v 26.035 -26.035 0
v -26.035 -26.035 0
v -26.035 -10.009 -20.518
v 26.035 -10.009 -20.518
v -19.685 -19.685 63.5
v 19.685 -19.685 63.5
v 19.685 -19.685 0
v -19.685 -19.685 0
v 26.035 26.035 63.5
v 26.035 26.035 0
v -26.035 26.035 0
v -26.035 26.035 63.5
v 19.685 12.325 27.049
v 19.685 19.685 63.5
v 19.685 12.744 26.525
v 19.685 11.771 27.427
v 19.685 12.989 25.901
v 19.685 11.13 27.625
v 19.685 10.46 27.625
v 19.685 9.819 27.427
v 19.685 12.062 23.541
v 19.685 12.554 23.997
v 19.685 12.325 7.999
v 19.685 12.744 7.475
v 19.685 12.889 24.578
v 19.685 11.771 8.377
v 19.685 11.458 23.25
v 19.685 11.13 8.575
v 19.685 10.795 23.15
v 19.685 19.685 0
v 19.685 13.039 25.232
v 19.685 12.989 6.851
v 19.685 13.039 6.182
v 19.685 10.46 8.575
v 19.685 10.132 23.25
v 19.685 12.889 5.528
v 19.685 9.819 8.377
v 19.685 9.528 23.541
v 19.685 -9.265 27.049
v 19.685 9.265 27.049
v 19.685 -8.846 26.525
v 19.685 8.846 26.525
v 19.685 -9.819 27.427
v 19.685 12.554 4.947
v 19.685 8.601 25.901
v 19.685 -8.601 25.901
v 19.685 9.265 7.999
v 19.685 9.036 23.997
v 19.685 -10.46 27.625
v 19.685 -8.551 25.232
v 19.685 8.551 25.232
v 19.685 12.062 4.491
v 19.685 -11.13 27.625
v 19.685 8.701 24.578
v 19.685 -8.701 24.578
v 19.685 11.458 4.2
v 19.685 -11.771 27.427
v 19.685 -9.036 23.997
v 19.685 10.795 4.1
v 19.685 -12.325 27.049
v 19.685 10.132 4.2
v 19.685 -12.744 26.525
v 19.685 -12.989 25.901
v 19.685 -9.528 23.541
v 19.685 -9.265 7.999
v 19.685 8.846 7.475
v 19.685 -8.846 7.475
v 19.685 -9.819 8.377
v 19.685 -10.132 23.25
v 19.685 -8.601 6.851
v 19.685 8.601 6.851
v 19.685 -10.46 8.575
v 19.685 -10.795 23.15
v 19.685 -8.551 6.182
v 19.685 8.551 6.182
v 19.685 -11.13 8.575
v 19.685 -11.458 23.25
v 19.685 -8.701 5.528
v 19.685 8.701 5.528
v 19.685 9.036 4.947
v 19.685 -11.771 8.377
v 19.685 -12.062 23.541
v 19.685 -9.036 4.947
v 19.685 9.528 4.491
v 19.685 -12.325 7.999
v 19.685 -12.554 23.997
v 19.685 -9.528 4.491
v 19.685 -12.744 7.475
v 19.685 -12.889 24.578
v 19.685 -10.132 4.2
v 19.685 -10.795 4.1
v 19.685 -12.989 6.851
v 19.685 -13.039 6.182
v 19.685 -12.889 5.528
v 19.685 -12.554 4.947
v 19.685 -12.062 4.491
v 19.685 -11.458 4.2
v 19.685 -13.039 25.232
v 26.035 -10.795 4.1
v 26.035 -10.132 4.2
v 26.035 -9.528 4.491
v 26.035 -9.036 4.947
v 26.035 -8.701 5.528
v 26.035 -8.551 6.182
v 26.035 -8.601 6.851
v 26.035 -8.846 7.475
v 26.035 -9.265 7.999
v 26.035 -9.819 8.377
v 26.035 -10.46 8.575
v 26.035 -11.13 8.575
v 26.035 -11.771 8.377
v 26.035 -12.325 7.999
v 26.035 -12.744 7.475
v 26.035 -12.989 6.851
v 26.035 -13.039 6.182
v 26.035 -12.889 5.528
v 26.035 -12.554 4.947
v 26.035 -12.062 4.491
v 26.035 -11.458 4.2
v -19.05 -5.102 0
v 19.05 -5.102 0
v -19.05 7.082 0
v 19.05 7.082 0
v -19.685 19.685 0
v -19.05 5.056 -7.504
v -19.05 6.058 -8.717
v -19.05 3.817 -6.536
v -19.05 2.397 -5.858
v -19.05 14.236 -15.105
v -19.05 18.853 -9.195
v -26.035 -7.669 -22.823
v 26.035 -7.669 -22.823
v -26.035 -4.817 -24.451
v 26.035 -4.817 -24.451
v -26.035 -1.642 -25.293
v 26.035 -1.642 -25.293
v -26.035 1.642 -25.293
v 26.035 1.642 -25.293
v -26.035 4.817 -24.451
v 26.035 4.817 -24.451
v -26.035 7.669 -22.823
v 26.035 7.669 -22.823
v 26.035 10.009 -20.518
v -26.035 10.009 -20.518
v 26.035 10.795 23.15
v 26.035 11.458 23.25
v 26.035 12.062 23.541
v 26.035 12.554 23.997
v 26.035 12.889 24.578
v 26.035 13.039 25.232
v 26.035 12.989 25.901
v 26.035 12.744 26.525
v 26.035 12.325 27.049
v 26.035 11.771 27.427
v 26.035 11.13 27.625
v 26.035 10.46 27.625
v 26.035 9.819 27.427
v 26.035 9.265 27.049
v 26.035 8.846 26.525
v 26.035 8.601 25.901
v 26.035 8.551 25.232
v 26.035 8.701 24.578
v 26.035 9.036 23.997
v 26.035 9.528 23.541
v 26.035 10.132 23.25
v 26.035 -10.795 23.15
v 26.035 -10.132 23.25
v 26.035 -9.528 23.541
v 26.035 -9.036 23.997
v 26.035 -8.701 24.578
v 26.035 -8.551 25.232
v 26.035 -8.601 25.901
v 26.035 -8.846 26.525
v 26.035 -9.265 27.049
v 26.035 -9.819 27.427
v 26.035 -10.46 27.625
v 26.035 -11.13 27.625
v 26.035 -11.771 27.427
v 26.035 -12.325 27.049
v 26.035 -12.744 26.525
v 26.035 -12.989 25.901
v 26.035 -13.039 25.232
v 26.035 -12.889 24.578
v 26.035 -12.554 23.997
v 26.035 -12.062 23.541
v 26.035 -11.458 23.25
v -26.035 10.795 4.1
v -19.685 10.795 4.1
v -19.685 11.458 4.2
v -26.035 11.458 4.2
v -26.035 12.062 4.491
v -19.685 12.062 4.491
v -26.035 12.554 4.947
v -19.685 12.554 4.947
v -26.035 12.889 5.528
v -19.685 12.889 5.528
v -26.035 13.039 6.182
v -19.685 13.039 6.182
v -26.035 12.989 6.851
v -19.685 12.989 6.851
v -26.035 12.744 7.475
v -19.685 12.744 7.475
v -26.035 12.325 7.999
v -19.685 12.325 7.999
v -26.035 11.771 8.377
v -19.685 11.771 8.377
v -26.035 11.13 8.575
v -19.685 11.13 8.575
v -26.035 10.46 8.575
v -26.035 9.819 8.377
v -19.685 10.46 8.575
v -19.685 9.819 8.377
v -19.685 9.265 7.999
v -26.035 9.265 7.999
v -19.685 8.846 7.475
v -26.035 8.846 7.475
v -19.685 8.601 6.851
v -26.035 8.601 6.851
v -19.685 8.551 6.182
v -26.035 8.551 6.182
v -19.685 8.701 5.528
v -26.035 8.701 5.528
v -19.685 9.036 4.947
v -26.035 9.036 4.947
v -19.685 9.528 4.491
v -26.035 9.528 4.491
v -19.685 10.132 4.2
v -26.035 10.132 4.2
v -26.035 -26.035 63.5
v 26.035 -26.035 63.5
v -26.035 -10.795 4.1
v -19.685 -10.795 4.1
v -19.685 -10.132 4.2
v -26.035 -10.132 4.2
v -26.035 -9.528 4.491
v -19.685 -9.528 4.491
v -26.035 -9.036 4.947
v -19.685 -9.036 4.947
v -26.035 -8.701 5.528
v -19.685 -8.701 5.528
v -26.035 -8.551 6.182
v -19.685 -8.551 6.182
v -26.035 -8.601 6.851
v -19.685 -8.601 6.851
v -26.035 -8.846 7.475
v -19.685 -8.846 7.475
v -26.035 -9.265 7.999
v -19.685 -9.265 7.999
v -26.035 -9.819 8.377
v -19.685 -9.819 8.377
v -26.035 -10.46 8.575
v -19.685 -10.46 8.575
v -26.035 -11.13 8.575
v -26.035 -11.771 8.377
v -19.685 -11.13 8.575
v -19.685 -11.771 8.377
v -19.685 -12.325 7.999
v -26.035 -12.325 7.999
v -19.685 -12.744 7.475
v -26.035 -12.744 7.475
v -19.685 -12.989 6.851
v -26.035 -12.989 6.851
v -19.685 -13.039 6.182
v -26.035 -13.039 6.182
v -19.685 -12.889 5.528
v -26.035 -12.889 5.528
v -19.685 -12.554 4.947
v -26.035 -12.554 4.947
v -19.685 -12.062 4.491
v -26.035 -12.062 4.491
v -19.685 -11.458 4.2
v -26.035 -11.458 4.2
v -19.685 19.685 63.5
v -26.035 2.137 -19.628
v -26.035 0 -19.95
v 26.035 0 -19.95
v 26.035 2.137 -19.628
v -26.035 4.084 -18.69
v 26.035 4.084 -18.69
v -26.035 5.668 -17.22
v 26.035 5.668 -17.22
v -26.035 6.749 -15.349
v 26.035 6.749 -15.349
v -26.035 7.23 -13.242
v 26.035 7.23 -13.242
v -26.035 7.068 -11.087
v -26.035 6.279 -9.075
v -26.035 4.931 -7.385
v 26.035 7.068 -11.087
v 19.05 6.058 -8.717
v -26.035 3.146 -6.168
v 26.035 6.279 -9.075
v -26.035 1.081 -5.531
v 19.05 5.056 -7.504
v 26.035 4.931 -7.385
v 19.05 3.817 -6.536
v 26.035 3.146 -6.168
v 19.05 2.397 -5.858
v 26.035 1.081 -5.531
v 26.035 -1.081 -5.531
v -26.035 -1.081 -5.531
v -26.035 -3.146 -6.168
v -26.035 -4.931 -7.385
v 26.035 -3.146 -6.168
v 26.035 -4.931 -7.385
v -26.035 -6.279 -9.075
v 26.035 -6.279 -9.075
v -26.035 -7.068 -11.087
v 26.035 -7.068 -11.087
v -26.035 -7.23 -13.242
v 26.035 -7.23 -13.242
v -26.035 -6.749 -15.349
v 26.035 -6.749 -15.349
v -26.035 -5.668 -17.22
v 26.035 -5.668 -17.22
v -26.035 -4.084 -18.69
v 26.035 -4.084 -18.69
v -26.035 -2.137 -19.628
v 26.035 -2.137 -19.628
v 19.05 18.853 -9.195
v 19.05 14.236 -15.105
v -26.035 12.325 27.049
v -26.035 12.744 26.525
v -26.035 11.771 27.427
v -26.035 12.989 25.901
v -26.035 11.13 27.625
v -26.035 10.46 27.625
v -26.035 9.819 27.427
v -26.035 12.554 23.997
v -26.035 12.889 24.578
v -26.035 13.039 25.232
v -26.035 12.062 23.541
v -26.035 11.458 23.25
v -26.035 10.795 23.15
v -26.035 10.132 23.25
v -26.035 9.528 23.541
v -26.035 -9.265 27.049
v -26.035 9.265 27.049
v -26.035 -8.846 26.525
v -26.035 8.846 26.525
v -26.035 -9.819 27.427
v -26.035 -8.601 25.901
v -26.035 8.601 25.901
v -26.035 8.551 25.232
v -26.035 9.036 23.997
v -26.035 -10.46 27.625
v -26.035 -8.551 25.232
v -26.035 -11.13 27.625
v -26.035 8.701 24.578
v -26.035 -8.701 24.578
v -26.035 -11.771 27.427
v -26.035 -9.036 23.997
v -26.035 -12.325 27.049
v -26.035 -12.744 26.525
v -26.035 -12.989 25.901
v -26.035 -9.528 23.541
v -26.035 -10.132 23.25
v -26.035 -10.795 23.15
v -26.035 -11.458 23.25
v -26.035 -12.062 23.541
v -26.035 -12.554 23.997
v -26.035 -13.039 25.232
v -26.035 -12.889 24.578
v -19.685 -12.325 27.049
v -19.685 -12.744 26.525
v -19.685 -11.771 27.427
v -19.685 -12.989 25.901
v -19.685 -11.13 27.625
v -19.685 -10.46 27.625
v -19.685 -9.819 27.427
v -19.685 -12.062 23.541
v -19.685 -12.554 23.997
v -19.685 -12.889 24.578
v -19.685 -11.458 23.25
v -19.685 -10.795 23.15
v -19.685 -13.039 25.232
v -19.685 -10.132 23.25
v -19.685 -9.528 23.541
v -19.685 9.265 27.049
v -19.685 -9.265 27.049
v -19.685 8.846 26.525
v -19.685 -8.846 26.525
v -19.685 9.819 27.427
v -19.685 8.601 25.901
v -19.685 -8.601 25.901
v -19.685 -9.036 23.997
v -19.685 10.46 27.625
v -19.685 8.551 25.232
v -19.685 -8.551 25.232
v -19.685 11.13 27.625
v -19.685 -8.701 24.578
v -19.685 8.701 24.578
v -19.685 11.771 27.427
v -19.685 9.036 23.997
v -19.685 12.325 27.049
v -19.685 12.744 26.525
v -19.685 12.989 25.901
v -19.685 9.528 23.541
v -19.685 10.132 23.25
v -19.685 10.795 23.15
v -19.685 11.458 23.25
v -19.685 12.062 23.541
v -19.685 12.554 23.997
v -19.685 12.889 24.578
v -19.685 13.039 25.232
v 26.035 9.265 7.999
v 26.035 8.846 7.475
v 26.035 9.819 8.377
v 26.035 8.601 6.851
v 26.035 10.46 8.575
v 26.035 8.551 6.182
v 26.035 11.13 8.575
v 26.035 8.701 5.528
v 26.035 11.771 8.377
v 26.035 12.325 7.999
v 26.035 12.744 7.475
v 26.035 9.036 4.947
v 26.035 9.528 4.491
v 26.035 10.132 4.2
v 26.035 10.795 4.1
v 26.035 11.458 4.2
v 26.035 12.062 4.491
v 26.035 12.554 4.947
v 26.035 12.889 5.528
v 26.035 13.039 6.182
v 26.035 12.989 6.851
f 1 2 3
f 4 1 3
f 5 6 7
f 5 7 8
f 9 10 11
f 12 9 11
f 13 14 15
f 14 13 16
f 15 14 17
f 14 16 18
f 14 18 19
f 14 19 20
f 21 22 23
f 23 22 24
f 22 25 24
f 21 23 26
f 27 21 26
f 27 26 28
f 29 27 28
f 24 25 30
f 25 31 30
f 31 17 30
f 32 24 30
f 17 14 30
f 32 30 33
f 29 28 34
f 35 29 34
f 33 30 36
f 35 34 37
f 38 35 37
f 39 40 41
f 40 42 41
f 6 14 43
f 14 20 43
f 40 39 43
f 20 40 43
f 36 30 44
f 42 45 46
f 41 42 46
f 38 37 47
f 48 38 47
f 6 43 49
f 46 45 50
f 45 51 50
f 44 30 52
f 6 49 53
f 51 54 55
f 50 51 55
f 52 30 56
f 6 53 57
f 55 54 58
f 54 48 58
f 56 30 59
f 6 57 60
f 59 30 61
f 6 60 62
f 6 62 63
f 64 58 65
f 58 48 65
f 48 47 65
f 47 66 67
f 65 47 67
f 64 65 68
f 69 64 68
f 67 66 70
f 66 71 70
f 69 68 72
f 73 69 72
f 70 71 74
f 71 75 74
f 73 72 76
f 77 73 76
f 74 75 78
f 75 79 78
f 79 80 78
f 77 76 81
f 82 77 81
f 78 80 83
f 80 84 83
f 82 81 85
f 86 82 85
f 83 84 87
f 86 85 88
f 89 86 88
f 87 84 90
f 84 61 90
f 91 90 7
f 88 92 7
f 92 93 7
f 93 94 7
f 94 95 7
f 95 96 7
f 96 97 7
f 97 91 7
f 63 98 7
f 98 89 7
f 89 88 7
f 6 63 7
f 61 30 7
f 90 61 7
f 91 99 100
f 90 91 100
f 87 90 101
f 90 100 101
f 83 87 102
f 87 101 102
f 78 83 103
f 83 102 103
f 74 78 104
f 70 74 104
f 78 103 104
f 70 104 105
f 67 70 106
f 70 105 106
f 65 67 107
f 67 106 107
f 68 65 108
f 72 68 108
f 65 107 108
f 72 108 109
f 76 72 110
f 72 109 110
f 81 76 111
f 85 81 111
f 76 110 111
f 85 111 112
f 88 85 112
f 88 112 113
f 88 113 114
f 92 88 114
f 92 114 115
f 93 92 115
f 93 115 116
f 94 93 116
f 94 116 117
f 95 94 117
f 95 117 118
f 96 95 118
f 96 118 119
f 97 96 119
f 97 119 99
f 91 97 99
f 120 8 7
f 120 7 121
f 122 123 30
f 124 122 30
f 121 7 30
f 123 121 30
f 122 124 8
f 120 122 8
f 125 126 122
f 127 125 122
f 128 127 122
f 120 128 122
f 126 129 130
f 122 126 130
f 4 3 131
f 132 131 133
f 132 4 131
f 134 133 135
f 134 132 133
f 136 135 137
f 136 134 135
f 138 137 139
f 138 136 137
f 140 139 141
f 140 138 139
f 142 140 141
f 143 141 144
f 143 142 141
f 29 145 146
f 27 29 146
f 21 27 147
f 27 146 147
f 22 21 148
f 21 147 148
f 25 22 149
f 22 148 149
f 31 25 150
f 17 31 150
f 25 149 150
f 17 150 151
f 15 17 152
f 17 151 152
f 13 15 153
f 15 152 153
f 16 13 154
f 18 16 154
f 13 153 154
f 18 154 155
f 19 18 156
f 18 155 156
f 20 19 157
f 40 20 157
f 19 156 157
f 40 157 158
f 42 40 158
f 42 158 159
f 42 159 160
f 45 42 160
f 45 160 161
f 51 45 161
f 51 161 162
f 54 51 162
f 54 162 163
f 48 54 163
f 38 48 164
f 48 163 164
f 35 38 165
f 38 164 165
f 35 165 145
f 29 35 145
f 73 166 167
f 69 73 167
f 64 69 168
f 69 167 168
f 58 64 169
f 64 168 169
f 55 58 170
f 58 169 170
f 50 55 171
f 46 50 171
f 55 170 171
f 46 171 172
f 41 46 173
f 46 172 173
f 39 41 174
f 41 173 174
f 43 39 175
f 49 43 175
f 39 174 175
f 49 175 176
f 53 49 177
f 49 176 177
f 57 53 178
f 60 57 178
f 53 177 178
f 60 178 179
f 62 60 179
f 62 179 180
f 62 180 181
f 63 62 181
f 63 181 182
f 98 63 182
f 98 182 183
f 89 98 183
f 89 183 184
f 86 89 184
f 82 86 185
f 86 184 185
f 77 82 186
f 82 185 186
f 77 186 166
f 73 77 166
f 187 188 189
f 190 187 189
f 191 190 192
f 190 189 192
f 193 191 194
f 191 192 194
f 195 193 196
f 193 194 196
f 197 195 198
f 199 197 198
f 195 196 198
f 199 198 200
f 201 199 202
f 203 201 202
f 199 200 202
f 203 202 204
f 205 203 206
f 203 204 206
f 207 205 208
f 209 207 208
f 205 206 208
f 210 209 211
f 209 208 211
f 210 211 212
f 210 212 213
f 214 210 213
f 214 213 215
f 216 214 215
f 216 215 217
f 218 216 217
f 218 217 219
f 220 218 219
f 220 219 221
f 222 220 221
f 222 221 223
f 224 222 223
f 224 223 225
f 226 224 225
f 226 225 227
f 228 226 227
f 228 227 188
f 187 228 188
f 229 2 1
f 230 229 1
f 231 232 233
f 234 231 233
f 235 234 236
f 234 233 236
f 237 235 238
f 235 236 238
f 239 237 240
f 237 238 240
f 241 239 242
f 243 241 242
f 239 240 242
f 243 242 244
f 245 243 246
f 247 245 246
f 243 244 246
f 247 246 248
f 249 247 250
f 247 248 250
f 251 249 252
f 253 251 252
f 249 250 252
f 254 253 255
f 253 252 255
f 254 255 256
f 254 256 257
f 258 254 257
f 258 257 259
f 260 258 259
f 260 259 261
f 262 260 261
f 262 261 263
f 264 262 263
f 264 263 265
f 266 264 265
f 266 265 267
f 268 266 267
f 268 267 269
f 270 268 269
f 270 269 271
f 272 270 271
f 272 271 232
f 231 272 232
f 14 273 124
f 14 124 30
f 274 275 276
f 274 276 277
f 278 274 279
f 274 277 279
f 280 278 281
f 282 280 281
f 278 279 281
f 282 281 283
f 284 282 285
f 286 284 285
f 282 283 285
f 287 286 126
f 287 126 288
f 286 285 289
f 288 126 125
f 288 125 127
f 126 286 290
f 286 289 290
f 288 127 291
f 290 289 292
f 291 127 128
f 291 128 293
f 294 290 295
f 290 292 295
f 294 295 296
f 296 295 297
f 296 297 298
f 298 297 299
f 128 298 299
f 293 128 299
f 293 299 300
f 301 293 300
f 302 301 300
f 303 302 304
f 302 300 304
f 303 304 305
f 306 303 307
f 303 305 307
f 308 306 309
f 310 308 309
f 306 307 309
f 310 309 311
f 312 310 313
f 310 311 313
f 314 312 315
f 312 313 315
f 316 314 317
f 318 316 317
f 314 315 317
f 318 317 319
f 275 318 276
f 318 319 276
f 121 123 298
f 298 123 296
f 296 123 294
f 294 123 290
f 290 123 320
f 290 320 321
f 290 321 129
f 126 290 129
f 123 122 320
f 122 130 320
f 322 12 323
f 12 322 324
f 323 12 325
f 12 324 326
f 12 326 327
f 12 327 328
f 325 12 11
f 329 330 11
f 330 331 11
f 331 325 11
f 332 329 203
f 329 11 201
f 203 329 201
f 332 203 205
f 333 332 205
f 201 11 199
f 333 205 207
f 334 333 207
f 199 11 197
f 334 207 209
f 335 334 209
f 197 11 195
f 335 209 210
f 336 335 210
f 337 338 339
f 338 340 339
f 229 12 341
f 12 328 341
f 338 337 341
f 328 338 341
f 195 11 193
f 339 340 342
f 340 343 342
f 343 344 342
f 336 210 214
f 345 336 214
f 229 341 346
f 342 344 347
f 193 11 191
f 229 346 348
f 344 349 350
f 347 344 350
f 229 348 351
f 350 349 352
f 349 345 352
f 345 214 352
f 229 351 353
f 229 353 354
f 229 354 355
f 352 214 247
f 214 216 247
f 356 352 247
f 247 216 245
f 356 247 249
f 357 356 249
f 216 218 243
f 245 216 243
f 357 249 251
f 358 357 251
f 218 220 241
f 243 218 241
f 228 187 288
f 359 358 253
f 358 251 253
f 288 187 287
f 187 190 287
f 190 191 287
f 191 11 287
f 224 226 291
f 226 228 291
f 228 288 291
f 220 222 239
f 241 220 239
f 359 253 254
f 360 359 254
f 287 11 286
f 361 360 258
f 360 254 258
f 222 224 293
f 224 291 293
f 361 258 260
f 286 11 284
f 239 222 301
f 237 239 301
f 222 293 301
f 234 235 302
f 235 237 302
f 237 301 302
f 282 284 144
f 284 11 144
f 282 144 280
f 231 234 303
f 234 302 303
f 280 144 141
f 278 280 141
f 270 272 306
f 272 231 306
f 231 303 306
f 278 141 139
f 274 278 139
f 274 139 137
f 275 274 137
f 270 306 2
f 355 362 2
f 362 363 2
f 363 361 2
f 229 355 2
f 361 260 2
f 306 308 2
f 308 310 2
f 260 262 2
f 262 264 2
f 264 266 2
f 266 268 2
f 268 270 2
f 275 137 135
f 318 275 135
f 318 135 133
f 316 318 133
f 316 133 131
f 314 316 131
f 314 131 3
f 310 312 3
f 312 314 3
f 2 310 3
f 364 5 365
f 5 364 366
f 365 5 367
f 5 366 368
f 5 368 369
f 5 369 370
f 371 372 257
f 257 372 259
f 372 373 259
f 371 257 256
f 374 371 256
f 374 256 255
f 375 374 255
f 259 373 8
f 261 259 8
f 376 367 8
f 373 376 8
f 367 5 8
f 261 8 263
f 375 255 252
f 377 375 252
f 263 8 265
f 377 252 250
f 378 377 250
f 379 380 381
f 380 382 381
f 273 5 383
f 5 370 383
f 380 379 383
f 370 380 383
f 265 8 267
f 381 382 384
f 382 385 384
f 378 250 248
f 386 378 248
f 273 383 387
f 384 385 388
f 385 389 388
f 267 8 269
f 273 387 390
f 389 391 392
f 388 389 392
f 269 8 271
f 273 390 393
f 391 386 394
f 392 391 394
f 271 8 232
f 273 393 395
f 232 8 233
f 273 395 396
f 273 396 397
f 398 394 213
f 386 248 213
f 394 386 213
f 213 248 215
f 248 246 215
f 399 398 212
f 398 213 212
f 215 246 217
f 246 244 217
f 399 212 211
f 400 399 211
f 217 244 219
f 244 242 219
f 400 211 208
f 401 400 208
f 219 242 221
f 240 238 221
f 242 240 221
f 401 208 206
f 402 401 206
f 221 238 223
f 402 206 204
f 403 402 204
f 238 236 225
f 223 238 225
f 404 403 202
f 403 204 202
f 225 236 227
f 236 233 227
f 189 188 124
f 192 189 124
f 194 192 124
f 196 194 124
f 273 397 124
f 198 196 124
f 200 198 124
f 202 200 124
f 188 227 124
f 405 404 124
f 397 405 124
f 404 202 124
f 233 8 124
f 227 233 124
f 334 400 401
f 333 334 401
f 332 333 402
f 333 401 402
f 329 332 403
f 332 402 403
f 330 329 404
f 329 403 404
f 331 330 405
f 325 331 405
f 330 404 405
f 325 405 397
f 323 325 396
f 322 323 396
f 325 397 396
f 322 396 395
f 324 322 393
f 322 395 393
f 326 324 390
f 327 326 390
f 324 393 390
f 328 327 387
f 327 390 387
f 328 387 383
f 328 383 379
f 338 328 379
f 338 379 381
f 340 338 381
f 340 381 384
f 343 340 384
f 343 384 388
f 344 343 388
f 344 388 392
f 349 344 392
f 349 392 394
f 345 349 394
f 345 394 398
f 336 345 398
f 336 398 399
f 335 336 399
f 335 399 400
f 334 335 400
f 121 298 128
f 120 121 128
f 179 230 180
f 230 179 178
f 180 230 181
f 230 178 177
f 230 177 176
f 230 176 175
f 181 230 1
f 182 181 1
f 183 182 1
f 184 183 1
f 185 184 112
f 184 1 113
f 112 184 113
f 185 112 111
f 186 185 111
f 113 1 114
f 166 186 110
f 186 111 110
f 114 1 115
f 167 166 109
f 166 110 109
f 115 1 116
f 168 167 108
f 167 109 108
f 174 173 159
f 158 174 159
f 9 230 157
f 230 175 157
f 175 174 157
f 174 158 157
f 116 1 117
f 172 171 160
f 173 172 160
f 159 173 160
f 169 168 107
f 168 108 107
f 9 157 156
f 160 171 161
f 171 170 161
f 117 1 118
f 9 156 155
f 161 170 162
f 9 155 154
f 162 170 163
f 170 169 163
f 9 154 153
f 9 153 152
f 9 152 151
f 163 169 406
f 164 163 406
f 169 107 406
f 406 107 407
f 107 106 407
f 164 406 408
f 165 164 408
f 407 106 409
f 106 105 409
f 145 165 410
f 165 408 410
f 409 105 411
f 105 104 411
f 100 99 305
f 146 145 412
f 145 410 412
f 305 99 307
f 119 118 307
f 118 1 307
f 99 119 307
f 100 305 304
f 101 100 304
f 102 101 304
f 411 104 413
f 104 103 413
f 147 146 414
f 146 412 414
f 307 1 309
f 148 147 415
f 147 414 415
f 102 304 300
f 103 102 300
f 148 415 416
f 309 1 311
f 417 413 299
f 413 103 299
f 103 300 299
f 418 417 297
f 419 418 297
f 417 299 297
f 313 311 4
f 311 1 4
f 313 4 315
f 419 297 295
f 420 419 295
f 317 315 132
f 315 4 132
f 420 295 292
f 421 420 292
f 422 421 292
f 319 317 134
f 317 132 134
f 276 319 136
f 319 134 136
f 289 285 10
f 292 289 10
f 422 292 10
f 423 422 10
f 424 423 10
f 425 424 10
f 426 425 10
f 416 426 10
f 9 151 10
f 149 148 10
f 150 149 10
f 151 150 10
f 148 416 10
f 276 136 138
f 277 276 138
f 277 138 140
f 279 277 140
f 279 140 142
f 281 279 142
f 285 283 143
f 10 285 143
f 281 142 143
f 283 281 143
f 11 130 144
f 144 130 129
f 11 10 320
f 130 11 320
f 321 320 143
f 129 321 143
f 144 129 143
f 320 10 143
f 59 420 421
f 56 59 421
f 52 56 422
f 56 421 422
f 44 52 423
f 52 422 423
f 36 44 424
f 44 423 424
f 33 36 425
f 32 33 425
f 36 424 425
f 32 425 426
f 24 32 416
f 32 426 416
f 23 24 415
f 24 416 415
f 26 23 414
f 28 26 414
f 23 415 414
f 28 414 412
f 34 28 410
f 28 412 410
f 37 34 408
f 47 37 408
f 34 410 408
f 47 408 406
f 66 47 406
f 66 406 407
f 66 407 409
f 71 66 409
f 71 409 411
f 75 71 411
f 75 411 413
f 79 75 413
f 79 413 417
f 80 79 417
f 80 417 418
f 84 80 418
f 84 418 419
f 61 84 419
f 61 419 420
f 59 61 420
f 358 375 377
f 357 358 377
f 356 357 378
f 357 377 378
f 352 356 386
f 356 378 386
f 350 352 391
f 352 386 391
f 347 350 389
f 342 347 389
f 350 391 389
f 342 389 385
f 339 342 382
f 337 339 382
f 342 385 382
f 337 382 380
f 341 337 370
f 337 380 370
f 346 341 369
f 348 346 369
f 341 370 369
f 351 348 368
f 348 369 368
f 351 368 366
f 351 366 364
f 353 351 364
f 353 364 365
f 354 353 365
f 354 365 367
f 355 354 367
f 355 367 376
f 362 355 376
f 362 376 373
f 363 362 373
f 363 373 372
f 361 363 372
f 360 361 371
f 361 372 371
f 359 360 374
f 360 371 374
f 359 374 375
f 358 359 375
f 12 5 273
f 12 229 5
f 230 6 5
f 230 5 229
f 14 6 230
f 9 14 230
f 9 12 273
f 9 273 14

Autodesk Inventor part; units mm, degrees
ref_plane "YZ Plane" through (0, 0, 0) normal (1, 0, 0) x (0, 1, 0)
ref_plane "XZ Plane" through (0, 0, 0) normal (0, 1, 0) x (-1, 0, 0)
ref_plane "XY Plane" through (0, 0, 0) normal (0, 0, 1) x (1, 0, 0)
sketch "Sketch1" plane through (0, 0, 0) normal (0, 0, 1) x (1, 0, 0)
  line L0 (19.685, -19.685) -> (-19.685, -19.685)
  line L1 (-19.685, -19.685) -> (-19.685, 19.685)
  line L2 (-19.685, 19.685) -> (19.685, 19.685)
  line L3 (19.685, 19.685) -> (19.685, -19.685)
  line L4 (19.685, -19.685) -> (-19.685, 19.685) construction
  line L5 (-19.685, -19.685) -> (19.685, 19.685) construction
  line L6 (26.035, 26.035) -> (-26.035, 26.035)
  line L7 (-26.035, 26.035) -> (-26.035, -26.035)
  line L8 (-26.035, -26.035) -> (26.035, -26.035)
  line L9 (26.035, -26.035) -> (26.035, 26.035)
  point P0 (0, 0)
  dimension "d0" = 39.37
  dimension "d1" = 39.37
  dimension "d2" = 6.35
extrude "Extrusion1" add sketch "Sketch1" along normal blind 63.5
sketch "Sketch2" plane through (26.035, -26.035, 0) normal (1, 0, 0) x (0, 0, -1)
  line L0 (-63.5, 45.72) -> (-63.5, 6.35) construction
  line L1 (-63.5, 26.035) -> (50.8, 26.035) construction
  circle A0 centre (12.7, 26.035) radius 7.25
  line L2 (0, 0) -> (0, 52.07) projected
  circle A1 centre (12.7, 26.035) radius 12.7
  line L3 (0, 52.07) -> (-63.5, 52.07) projected
  line L4 (0, 52.07) -> (20.5177, 36.0436)
  line L5 (0, 0) -> (-63.5, 0) projected
  line L6 (0, 0) -> (20.5177, 16.0264)
  point P0 (0, 26.035)
  dimension "d5" = 114.3
  dimension "d6" = 14.5
  dimension "d7" = 12.7
  dimension "d8" = 25.4
extrude "Extrusion2" add sketch "Sketch2" against normal up to surface (52.07 mm away)
sketch "Sketch3" plane through (26.035, -26.035, 63.5) normal (1, 0, 0) x (0, 0, -1)
  circle A0 centre (76.2, 26.035) radius 7.25 projected
  line L0 (63.5, 52.07) -> (0, 52.07) projected
  line L1 (0, 0) -> (0, 52.07) projected
  line L2 (63.5, 0) -> (0, 0) projected
  line L3 (63.5, 0) -> (84.0177, 16.0264) projected
  arc A1 (84.0177, 16.0264) -> (84.0177, 36.0436) centre (76.2, 26.035) ccw projected
  line L4 (84.0177, 36.0436) -> (63.5, 52.07) projected
  line L5 (63.5, 45.72) -> (63.5, 6.35) construction
  circle A2 centre (57.15, 36.83) radius 2.25
  line L6 (63.5, 45.72) -> (0, 45.72) construction
  line L7 (63.5, 45.72) -> (0, 45.72) construction
  line L8 (63.5, 6.35) -> (0, 6.35) construction
  line L9 (63.5, 6.35) -> (0, 6.35) construction
  circle A3 centre (57.15, 15.24) radius 2.25
  circle A4 centre (38.1, 36.83) radius 2.25
  circle A5 centre (38.1, 15.24) radius 2.25
  point P0 (63.5, 26.035)
  dimension "d11" = 4.5
  dimension "d12" = 6.35
  dimension "d13" = 8.89
  dimension "d14" = 4.5
  dimension "d15" = 6.35
  dimension "d16" = 8.89
  dimension "d17" = 4.5
  dimension "d18" = 19.05
  dimension "d19" = 8.89
  dimension "d20" = 4.5
  dimension "d21" = 19.05
  dimension "d22" = 8.89
extrude "Extrusion3" cut sketch "Sketch3" against normal through all contours A2 | A3 | A4 | A5
sketch "Sketch5" plane through (-26.035, 26.035, 0) normal (0, 0.7880827, -0.6155694) x (1, 0, 0)
  line L0 (0, 26.035) -> (0, 0) projected
  line L1 (52.07, 0) -> (0, 0) projected
  line L2 (52.07, 26.035) -> (52.07, 0) projected
  line L3 (52.07, 26.035) -> (0, 26.035) projected
  line L4 (6.35, 3.9089) -> (45.72, 3.9089) construction
  line L5 (26.035, 3.9089) -> (26.035, 26.035) construction
  line L6 (6.35, 15.4171) -> (0, 15.4171) construction
  line L7 (0, 15.4171) -> (52.07, 15.4171) construction
  line L8 (52.07, 15.4171) -> (45.72, 15.4171) construction
  line L9 (45.085, 19.1671) -> (6.985, 19.1671)
  line L10 (6.985, 19.1671) -> (6.985, 11.6671)
  line L11 (6.985, 11.6671) -> (45.085, 11.6671)
  line L12 (45.085, 11.6671) -> (45.085, 19.1671)
  line L13 (45.085, 19.1671) -> (6.985, 11.6671) construction
  line L14 (6.985, 19.1671) -> (45.085, 11.6671) construction
  point P0 (26.035, 16.0264)
  point P1 (26.035, 15.4171)
  dimension "d30" = 38.1
  dimension "d31" = 7.5
extrude "Extrusion5" cut sketch "Sketch5" against normal up to surface contours L12 L11 L10 L9 surface through (19.685, -19.685, 0) normal (0, 1, 0)
properties part number "CS_Climb_Outer_Tube_End_Cap"
